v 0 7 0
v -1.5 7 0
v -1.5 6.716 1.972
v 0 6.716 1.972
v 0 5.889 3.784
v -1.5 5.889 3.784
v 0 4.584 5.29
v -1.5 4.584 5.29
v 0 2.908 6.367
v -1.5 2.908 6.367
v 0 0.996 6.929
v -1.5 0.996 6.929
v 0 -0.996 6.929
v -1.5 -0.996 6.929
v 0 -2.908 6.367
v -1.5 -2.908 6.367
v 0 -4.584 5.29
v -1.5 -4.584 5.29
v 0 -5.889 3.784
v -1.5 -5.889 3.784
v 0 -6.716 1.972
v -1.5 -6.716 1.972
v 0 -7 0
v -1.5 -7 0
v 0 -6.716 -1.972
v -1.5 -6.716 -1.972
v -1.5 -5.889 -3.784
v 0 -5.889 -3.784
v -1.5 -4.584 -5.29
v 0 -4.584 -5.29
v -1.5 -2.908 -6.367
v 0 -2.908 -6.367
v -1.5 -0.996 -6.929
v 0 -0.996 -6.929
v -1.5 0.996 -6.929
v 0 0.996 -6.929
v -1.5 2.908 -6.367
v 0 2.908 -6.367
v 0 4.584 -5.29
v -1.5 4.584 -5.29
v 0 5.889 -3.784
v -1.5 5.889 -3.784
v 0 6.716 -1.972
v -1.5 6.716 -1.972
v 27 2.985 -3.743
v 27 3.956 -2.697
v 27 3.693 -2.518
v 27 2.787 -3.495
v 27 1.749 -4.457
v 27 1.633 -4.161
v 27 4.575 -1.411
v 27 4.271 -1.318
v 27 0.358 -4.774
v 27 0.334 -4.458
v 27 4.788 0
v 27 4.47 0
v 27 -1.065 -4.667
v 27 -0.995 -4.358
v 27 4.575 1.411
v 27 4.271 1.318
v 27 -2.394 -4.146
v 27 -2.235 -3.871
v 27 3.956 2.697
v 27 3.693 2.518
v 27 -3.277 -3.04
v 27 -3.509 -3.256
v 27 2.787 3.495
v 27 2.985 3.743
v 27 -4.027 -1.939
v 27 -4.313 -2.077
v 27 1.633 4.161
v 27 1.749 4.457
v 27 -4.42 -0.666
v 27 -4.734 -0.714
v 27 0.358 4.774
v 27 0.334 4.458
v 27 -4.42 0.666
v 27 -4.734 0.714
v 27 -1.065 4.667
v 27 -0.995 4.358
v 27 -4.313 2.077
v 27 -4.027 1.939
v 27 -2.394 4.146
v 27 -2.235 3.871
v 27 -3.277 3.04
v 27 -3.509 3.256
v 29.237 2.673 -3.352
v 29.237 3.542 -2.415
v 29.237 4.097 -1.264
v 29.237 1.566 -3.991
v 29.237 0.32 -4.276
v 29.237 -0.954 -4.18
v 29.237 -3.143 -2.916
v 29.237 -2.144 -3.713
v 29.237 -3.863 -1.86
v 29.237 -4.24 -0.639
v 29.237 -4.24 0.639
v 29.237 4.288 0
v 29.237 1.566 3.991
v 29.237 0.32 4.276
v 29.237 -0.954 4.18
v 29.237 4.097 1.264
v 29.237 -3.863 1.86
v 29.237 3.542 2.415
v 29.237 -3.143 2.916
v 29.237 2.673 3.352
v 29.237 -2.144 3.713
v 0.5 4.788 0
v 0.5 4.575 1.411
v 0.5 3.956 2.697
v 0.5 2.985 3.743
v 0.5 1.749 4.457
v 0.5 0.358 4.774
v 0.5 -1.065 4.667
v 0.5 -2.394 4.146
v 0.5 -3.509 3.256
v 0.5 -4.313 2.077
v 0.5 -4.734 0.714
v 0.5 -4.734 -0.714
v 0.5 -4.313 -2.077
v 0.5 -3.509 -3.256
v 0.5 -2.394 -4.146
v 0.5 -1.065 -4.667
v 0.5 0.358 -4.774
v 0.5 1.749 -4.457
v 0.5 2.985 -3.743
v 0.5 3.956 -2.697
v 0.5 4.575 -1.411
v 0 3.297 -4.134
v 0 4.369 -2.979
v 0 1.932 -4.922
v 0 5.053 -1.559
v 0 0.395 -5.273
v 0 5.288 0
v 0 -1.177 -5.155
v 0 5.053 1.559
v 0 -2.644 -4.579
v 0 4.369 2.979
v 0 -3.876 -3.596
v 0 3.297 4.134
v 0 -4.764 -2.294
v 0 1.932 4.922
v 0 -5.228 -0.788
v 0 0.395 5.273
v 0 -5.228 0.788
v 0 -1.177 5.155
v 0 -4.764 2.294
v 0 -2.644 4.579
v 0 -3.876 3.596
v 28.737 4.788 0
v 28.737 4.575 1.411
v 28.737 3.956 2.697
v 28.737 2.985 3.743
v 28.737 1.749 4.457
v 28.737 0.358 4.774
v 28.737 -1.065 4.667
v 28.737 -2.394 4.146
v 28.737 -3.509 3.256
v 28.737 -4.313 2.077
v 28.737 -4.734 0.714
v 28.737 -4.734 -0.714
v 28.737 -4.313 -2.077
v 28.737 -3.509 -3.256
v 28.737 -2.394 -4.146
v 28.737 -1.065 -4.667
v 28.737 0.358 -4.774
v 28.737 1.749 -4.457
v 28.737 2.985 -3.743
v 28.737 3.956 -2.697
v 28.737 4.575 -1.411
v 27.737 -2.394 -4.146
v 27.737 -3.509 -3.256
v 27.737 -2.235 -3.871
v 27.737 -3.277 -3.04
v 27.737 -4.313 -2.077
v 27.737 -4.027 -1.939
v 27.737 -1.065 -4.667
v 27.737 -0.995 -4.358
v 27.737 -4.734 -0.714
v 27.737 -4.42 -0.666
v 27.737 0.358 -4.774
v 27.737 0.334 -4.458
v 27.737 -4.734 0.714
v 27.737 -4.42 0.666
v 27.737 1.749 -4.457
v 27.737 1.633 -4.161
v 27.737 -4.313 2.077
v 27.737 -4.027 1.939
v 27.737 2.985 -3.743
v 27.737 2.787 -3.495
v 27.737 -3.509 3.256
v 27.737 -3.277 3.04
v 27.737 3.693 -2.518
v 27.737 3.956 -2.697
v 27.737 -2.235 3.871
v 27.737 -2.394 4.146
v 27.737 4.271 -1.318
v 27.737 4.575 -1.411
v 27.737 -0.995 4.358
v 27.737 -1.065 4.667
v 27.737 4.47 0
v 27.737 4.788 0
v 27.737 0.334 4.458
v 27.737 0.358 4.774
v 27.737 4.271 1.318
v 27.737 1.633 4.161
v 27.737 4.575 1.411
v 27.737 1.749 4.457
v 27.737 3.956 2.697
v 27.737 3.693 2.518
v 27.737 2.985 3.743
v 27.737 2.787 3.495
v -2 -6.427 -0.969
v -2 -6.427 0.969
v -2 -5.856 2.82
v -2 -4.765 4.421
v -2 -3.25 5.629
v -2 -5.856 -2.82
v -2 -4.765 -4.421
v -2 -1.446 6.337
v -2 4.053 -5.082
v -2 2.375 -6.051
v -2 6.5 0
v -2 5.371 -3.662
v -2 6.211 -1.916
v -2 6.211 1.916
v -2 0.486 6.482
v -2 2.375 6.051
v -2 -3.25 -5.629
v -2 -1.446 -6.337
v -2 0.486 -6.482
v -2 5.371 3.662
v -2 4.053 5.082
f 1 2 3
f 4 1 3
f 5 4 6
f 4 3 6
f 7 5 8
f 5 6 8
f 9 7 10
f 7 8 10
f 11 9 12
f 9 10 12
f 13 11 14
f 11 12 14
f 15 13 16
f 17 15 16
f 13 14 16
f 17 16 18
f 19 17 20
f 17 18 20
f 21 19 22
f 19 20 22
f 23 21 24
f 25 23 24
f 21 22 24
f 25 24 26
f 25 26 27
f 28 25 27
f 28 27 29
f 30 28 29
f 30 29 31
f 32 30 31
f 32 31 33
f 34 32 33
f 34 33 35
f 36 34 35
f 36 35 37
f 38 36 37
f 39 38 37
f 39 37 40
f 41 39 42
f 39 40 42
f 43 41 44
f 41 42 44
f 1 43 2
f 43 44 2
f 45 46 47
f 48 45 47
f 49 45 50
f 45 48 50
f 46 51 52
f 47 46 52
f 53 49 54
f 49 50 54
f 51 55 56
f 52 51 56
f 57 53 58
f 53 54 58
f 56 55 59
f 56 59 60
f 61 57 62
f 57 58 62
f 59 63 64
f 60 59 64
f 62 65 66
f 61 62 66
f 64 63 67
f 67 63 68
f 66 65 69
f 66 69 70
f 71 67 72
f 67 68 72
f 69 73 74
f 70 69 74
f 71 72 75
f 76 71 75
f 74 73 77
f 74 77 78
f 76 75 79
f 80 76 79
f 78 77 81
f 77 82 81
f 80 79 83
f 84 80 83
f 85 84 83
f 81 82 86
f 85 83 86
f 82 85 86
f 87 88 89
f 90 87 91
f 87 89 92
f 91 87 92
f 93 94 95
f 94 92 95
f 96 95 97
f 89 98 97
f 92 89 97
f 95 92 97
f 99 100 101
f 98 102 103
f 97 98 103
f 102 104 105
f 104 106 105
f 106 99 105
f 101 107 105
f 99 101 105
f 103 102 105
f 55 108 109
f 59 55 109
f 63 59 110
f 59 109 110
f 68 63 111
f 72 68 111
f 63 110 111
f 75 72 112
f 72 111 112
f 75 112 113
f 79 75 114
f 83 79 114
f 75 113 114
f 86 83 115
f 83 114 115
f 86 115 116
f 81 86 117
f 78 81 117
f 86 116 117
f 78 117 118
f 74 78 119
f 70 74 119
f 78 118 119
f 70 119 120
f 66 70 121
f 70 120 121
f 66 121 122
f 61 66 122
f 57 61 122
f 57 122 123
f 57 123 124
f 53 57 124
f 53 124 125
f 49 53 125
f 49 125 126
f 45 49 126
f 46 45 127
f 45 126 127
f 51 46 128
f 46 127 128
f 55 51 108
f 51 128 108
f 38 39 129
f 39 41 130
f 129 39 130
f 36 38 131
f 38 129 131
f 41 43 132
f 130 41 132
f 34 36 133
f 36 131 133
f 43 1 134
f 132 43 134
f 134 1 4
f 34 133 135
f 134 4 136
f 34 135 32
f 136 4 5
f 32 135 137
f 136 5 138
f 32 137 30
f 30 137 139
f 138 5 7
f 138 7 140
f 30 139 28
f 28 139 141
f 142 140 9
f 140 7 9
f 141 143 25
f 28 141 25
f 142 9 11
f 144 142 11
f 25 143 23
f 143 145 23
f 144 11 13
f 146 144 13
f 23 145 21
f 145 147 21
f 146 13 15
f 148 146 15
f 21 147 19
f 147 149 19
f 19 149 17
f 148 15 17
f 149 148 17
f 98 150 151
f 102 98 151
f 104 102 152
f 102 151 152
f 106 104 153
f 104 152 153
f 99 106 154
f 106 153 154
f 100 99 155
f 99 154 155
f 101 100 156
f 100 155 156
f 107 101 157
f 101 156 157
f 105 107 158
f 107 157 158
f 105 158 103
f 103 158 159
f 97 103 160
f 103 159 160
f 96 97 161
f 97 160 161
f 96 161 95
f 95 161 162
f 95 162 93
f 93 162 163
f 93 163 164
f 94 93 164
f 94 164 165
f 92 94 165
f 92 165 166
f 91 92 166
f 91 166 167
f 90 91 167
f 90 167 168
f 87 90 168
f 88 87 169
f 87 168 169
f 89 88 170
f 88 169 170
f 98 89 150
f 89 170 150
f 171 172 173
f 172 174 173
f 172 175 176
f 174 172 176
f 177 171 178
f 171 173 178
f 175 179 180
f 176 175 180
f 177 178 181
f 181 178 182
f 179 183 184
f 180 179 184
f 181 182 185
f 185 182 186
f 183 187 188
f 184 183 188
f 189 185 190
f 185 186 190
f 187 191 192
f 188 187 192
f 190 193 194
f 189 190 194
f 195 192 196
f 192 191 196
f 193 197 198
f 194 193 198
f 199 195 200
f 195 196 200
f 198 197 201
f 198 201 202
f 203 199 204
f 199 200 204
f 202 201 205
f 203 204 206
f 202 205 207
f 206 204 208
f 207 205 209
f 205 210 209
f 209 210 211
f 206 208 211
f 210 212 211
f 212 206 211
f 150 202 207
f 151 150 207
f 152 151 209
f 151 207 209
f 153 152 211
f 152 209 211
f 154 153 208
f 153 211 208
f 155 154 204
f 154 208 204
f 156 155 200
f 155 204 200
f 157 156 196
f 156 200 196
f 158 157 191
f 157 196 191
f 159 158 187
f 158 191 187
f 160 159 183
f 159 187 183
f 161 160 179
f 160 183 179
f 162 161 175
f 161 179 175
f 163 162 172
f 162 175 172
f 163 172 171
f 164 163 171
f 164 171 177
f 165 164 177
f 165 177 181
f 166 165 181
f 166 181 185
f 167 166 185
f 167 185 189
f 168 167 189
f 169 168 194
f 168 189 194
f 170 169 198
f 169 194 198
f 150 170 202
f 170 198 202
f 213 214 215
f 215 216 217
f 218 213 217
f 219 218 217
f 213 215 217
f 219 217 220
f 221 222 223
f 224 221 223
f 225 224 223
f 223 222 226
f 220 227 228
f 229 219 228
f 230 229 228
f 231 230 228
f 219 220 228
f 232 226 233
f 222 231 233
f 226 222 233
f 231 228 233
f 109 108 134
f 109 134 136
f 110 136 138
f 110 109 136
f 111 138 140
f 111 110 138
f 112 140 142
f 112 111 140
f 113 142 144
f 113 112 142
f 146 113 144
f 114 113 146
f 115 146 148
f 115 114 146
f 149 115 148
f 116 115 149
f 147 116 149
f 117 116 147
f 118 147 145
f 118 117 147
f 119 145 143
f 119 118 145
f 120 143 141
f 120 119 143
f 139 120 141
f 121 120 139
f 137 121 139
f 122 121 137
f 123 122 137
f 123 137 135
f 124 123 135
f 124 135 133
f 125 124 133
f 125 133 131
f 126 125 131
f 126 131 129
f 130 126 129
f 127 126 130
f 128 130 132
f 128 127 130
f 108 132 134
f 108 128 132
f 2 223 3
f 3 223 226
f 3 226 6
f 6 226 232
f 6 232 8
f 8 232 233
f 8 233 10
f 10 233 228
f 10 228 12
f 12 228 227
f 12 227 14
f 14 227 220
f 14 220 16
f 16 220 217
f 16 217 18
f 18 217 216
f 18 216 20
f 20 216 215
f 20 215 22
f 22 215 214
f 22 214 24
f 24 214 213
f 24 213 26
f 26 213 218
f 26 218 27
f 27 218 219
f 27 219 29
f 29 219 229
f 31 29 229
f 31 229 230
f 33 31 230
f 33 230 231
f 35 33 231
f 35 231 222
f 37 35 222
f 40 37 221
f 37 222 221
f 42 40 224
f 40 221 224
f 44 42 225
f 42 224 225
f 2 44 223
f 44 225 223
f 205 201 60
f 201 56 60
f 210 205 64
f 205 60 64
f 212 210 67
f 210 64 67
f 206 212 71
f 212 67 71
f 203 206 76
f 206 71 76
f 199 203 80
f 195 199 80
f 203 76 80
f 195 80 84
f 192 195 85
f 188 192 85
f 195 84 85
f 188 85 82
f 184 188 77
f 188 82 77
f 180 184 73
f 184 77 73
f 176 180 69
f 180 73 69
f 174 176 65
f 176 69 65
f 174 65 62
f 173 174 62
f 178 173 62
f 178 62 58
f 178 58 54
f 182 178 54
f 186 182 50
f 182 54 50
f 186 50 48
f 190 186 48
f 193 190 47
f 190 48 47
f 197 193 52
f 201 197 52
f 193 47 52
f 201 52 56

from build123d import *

# Parameters (mm, degrees)
CHAMFER1_SIZE = 0.5


with BuildPart() as part:
    # Sketch1 → Revolve1 (revolve)
    with BuildSketch(Plane.XY):
        Polygon((0, 4.7875), (0, 7), (-2, 7), (-2, 0), (29.237, 0), (29.237, 4.7875), (27.737, 4.7875), (27.737, 4.47), (27, 4.47), (27, 4.7875), align=None)
    revolve(axis=Axis((-78.535413295, 0, 0), (1, 0, 0)))

    # Chamfer1
    chamfer1_edges = [part.edges().sort_by_distance(p)[0] for p in [
        (0, -4.7875, 0),
        (-2, -7, 0),
        (29.237, -4.7875, 0),
    ]]
    chamfer(chamfer1_edges, length=CHAMFER1_SIZE)


solid = part.part
